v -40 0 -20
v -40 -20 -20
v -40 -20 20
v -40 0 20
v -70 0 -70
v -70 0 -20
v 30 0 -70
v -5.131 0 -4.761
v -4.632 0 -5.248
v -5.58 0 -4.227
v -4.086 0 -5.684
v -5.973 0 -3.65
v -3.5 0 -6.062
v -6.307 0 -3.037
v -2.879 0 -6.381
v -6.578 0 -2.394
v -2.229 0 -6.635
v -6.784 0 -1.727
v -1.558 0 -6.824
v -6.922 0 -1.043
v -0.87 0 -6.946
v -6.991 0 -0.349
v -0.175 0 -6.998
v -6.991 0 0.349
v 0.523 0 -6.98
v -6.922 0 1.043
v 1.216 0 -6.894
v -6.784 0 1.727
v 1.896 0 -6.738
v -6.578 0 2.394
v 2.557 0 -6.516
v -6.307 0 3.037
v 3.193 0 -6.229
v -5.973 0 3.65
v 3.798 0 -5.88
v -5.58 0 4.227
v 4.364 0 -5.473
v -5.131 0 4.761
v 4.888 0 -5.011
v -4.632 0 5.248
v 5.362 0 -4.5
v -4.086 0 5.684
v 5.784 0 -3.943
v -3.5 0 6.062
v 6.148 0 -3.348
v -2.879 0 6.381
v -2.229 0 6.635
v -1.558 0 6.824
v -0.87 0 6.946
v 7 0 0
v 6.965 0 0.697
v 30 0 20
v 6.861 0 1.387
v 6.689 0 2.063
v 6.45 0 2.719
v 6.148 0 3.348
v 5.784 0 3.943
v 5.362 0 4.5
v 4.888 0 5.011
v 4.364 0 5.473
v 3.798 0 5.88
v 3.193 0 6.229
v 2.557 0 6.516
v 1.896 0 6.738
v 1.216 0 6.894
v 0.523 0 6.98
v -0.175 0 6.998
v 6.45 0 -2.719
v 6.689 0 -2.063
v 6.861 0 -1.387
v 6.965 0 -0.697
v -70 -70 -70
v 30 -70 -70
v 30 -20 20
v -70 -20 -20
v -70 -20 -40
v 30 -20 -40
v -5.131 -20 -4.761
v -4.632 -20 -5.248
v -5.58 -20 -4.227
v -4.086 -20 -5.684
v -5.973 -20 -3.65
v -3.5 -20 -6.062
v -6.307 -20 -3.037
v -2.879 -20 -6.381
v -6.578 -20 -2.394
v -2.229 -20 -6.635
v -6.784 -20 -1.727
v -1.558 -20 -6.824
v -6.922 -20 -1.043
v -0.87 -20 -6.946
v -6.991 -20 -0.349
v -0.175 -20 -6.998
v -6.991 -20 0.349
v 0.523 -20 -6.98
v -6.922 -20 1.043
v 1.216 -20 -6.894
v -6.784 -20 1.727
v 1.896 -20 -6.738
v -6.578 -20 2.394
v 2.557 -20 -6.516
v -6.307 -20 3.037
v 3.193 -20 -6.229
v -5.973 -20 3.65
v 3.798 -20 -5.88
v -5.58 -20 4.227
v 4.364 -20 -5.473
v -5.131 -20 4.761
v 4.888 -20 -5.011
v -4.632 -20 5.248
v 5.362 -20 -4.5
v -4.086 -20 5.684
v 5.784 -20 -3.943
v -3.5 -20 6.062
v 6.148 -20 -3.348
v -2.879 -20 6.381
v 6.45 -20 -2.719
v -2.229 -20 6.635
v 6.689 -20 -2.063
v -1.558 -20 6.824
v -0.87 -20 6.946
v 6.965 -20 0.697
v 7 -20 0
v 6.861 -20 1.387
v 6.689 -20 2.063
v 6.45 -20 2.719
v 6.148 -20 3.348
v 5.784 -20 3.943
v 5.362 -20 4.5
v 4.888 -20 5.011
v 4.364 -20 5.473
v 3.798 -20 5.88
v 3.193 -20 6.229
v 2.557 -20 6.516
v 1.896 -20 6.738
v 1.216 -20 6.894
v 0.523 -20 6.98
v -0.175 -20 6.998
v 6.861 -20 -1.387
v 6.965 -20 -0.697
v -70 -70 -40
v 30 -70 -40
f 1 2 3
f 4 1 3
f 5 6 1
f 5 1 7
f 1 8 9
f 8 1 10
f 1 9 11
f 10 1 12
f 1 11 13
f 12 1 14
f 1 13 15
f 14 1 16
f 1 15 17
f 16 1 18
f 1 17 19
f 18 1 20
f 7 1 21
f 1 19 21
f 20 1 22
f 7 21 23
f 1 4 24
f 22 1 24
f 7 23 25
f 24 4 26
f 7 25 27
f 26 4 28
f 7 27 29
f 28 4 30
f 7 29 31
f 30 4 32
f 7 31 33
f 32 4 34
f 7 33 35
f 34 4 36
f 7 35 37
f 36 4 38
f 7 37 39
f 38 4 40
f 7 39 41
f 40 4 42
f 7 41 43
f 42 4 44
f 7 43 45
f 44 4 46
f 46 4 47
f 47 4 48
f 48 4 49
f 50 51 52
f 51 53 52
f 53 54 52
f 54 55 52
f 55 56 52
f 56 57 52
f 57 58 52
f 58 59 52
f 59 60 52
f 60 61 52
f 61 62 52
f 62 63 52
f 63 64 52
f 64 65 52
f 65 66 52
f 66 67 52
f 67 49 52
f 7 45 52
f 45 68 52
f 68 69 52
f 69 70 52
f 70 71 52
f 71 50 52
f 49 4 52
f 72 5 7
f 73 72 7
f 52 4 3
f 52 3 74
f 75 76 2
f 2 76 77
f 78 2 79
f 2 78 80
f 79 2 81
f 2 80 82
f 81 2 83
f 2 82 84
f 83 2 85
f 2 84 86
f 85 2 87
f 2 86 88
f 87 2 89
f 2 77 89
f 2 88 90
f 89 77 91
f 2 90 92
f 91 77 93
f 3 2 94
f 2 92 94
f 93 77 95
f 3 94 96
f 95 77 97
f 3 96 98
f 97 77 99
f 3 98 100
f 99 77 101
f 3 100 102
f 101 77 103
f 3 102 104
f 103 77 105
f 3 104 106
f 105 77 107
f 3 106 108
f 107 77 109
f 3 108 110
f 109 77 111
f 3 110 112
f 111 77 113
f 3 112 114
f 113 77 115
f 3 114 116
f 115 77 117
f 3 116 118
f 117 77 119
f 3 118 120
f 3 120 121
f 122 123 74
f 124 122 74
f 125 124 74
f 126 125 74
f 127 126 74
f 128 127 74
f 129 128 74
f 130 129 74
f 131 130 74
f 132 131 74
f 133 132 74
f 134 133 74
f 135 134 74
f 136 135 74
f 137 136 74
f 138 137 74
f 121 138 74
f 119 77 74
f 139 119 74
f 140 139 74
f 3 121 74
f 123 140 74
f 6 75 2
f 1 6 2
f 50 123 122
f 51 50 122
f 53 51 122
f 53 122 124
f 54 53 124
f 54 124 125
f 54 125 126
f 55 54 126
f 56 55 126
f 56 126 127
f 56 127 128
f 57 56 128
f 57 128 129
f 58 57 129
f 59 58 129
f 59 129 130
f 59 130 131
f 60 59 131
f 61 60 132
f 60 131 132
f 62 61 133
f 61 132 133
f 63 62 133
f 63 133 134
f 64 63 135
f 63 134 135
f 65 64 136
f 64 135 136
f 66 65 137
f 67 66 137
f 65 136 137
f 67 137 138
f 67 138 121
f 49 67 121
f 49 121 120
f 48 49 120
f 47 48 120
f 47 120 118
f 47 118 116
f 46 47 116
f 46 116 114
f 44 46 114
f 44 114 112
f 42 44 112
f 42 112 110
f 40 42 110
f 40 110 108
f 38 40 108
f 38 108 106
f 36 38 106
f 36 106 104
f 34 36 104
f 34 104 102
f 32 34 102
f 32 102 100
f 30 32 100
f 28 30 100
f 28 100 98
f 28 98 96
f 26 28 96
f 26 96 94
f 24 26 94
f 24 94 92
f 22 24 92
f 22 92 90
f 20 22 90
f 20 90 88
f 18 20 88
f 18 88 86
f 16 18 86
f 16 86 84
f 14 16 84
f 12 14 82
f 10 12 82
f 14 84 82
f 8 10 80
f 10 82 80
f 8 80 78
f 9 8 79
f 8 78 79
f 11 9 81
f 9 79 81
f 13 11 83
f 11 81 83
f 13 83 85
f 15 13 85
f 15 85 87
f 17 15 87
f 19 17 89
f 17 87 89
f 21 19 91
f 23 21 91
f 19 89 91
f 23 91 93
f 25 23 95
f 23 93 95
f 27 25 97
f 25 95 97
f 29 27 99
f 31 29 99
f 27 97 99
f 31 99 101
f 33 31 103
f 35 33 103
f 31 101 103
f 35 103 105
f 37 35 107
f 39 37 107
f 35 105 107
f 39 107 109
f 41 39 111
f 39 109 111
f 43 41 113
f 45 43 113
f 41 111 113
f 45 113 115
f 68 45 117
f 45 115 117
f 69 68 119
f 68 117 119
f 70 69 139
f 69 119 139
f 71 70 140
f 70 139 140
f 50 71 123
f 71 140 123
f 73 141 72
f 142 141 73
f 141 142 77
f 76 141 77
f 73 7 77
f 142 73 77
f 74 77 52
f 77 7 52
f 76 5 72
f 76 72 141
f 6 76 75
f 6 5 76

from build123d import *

# Parameters (mm, degrees)
F0_W     = 100
F0_H     = 90
F1_DEPTH = 70
F2_W     = 60
F2_H     = 70
F3_DEPTH = 100.001
F4_W     = 40
F4_H     = 50
F5_DEPTH = 20.001
F6_R     = 7
F7_DEPTH = 20.001


with BuildPart() as f1:
    # F0 (on Front) → F1 (new body)
    with BuildSketch(Plane.XZ):
        with Locations((-20, -25)):
            Rectangle(F0_W, F0_H)
    extrude(amount=F1_DEPTH)

    # F2 (on face) → F3 (cut, through all)
    with BuildSketch(Plane.YZ.offset(30)):
        with Locations((-50, -5)):
            Rectangle(F2_W, F2_H)
    extrude(amount=-F3_DEPTH, mode=Mode.SUBTRACT)

    # F4 (on face) → F5 (cut, through all)
    with BuildSketch(Plane.XZ.offset(20)):
        with Locations((-60, 5)):
            Rectangle(F4_W, F4_H)
    extrude(amount=-F5_DEPTH, mode=Mode.SUBTRACT)

    # F6 (on face) → F7 (cut, through all)
    with BuildSketch(Plane.XZ.offset(20)):
        Circle(F6_R)
    extrude(amount=-F7_DEPTH, mode=Mode.SUBTRACT)


solid = f1.part
